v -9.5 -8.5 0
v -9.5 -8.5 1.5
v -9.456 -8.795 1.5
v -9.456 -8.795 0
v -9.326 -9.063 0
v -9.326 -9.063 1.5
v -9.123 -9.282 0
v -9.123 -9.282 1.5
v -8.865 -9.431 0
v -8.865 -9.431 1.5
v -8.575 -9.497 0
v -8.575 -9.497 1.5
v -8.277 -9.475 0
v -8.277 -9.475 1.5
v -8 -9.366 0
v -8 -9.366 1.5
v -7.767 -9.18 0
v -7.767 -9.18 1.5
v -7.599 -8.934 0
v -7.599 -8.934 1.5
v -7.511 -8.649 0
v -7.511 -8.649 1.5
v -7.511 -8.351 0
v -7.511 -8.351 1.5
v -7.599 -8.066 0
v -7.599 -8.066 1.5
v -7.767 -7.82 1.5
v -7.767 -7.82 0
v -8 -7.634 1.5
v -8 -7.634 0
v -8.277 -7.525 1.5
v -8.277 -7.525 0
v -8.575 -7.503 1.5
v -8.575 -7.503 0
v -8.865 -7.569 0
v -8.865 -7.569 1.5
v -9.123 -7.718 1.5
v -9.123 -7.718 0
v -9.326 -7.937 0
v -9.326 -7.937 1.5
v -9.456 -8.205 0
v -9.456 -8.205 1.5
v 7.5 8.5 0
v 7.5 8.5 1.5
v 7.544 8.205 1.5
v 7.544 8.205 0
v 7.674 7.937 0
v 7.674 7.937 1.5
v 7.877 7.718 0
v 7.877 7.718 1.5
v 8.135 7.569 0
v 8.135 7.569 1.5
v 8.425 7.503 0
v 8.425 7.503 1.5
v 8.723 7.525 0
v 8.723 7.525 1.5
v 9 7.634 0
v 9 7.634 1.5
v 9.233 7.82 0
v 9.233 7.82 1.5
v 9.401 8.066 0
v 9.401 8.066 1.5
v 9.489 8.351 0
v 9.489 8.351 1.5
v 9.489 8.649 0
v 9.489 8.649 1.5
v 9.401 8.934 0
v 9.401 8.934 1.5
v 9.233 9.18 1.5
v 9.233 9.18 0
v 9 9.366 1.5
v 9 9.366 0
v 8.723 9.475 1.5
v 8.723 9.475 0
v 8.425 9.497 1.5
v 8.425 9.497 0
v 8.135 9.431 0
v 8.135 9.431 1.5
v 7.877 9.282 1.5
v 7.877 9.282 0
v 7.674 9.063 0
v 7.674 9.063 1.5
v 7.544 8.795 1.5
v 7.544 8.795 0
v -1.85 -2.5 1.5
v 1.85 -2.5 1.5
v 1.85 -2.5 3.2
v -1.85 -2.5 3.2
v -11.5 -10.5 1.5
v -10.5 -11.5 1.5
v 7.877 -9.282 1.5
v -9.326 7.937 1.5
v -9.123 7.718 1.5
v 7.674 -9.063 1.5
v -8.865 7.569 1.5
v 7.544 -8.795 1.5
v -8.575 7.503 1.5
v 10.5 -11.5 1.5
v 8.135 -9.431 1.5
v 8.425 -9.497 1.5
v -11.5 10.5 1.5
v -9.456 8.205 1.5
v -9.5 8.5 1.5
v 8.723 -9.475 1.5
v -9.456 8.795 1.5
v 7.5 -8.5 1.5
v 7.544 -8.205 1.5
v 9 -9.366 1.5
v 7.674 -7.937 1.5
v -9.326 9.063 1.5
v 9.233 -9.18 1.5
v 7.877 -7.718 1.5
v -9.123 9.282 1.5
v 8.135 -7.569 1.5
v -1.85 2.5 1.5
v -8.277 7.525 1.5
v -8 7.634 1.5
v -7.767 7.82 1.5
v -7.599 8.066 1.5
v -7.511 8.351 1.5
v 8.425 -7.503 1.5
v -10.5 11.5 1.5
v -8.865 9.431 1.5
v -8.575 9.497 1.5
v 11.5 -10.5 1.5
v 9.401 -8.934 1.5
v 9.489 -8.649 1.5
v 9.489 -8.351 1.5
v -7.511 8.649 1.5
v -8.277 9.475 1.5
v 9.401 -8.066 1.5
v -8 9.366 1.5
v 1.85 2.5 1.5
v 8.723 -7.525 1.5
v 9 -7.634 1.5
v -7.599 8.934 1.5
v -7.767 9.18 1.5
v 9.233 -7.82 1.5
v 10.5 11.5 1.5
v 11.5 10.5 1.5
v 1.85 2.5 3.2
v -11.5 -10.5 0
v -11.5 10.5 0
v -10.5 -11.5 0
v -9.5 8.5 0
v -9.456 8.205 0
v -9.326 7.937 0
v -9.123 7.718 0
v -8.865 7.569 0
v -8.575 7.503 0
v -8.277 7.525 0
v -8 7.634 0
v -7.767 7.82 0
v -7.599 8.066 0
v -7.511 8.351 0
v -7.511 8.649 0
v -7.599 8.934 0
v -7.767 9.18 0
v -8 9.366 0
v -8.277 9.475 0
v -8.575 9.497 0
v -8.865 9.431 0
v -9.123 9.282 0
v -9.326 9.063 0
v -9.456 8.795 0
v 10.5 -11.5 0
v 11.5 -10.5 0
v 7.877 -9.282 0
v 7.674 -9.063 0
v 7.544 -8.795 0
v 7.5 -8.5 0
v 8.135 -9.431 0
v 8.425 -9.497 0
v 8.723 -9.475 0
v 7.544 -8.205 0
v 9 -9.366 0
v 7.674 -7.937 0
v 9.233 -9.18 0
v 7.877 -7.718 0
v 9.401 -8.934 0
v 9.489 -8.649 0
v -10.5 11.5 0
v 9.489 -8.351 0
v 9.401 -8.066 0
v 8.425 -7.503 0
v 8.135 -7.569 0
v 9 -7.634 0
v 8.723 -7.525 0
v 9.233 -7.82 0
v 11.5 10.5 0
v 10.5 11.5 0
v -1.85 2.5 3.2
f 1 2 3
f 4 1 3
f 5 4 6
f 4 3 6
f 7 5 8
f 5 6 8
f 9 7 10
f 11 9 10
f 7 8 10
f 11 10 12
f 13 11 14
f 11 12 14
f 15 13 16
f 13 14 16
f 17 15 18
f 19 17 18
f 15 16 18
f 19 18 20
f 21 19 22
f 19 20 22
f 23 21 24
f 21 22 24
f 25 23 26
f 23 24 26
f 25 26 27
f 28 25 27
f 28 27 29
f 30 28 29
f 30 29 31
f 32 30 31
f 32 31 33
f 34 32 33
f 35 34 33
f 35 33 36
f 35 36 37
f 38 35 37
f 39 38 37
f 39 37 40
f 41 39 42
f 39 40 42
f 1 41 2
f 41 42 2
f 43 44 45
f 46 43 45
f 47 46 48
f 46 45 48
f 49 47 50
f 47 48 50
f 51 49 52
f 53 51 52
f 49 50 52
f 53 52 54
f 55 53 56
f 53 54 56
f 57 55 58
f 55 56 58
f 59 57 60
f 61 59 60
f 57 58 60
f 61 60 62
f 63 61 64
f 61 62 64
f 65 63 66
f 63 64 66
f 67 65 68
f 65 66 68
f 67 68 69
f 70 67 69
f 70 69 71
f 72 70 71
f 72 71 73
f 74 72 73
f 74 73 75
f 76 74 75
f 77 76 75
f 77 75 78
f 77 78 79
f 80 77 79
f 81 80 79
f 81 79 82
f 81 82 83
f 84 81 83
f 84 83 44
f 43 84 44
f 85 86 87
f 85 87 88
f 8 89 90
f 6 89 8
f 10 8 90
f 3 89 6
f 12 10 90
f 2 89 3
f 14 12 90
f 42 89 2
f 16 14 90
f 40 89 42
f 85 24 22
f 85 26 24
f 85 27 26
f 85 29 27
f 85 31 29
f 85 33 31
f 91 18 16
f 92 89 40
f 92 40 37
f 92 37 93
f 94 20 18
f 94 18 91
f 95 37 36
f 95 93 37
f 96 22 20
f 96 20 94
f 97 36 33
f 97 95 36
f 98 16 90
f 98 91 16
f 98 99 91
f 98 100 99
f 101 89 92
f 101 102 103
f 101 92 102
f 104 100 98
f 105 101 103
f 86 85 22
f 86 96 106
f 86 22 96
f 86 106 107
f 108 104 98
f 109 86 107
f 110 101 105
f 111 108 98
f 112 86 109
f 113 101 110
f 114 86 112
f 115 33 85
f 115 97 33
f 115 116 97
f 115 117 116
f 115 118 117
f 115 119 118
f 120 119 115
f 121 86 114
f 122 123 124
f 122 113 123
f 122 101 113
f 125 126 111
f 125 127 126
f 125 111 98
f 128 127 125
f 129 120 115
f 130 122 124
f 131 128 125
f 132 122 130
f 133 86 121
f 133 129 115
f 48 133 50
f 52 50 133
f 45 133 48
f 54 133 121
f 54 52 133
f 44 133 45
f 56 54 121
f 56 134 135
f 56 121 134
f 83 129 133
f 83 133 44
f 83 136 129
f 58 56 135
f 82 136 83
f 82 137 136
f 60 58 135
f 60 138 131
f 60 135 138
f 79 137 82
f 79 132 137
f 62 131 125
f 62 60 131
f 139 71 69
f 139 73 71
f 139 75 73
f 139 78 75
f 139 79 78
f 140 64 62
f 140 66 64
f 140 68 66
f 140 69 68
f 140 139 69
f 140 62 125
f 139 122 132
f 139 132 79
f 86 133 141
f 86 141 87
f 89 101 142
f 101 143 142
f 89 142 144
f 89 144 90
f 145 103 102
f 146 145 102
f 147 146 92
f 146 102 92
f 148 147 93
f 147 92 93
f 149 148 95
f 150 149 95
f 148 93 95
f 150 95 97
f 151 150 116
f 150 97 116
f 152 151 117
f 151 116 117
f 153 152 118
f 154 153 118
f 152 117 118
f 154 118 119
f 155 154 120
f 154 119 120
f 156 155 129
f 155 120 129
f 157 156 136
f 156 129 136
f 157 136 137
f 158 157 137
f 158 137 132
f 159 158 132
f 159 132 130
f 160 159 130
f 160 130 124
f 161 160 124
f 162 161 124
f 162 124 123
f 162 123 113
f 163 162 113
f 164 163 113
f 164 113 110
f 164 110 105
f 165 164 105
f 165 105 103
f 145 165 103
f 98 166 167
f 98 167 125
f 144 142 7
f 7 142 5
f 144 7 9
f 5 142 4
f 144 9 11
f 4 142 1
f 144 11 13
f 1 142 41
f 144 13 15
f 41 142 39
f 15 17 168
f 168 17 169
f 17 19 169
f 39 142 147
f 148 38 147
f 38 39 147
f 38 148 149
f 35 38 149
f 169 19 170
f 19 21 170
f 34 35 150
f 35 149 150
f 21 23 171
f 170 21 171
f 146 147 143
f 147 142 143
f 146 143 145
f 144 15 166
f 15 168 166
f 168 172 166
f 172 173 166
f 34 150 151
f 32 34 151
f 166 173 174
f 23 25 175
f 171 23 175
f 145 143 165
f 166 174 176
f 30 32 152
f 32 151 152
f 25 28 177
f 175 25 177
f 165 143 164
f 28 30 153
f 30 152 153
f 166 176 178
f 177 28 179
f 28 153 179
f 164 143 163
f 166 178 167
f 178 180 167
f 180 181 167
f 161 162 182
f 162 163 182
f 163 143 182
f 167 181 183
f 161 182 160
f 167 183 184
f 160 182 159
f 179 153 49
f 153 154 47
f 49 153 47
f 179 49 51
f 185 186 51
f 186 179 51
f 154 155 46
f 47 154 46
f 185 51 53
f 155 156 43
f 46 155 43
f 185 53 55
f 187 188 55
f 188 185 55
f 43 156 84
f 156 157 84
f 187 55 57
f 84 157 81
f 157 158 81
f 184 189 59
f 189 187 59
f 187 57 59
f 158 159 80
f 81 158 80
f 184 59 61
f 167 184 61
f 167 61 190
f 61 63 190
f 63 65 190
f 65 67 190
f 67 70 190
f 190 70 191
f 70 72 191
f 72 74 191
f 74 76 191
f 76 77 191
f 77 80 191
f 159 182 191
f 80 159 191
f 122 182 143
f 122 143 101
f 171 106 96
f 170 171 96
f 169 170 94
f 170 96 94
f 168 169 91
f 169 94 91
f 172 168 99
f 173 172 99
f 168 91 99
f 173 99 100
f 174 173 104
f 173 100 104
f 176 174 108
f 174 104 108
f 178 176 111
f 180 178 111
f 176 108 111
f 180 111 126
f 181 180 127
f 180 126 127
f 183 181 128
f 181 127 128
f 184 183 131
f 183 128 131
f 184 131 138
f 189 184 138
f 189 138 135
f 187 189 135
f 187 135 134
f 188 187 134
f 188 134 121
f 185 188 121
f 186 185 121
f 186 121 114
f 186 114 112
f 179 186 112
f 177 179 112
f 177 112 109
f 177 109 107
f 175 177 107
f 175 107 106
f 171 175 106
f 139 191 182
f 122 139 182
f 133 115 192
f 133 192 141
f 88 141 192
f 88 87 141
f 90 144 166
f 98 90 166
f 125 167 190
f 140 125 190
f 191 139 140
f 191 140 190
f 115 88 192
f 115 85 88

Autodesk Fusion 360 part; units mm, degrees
sketch "Sketch1" plane through (0, 0, 0) normal (0, 0, 1) x (1, 0, 0)
  line L0 (11.5, 11.5) -> (-11.5, 11.5)
  line L1 (-11.5, 11.5) -> (-11.5, -11.5)
  line L2 (-11.5, -11.5) -> (11.5, -11.5)
  line L3 (11.5, -11.5) -> (11.5, 11.5)
  line L4 (11.5, 11.5) -> (-11.5, -11.5) construction
  line L5 (-11.5, 11.5) -> (11.5, -11.5) construction
  dimension "d1" = 23
  dimension "d2" = 23
extrude "Extrude1" add sketch "Sketch1" along normal blind 1.5
chamfer "Chamfer1" distance 1 angle 45 4 edges at (-11.5, -11.5, 0.75) (11.5, -11.5, 0.75) (11.5, 11.5, 0.75) (-11.5, 11.5, 0.75)
sketch "Sketch2" plane through (0, 0, 1.5) normal (0, 0, 1) x (-1, 0, 0)
  line L0 (10.5, -11.5) -> (11.5, -10.5)
  line L1 (11.5, -10.5) -> (11.5, 10.5)
  line L2 (11.5, 10.5) -> (10.5, 11.5)
  line L3 (10.5, 11.5) -> (-10.5, 11.5)
  line L4 (-10.5, 11.5) -> (-11.5, 10.5)
  line L5 (-11.5, 10.5) -> (-11.5, -10.5)
  line L6 (-11.5, -10.5) -> (-10.5, -11.5)
  line L7 (-10.5, -11.5) -> (10.5, -11.5)
  line L8 (-1.85, 2.5) -> (1.85, 2.5)
  line L9 (1.85, 2.5) -> (1.85, -2.5)
  line L10 (1.85, -2.5) -> (-1.85, -2.5)
  line L11 (-1.85, -2.5) -> (-1.85, 2.5)
  line L12 (-1.85, 2.5) -> (1.85, -2.5) construction
  line L13 (1.85, 2.5) -> (-1.85, -2.5) construction
  dimension "d6" = 3.7
  dimension "d7" = 5
extrude "Extrude2" add sketch "Sketch2" along normal blind 1.7 contours L8 L9 L10 L11
sketch "Sketch3" plane through (0, 0, 1.5) normal (0, 0, 1) x (-1, 0, 0)
  line L0 (-1.85, -2.5) -> (-1.85, 2.5)
  line L1 (-1.85, 2.5) -> (1.85, 2.5)
  line L2 (1.85, 2.5) -> (1.85, -2.5)
  line L3 (1.85, -2.5) -> (-1.85, -2.5)
  line L4 (10.5, -11.5) -> (11.5, -10.5)
  line L5 (11.5, -10.5) -> (11.5, 10.5)
  line L6 (11.5, 10.5) -> (10.5, 11.5)
  line L7 (10.5, 11.5) -> (-10.5, 11.5)
  line L8 (-10.5, 11.5) -> (-11.5, 10.5)
  line L9 (-11.5, 10.5) -> (-11.5, -10.5)
  line L10 (-11.5, -10.5) -> (-10.5, -11.5)
  line L11 (-10.5, -11.5) -> (10.5, -11.5)
  line L12 (-8.5, -8.5) -> (8.5, -8.5) construction
  line L13 (8.5, -8.5) -> (8.5, 8.5) construction
  line L14 (8.5, 8.5) -> (-8.5, 8.5) construction
  line L15 (-8.5, 8.5) -> (-8.5, -8.5) construction
  line L16 (-8.5, -8.5) -> (8.5, 8.5) construction
  line L17 (8.5, -8.5) -> (-8.5, 8.5) construction
  circle A0 centre (8.5, -8.5) radius 1
  circle A1 centre (-8.5, -8.5) radius 1
  circle A2 centre (-8.5, 8.5) radius 1
  circle A3 centre (8.5, 8.5) radius 1
  dimension "d10" = 2
  dimension "d11" = 17
extrude "Extrude3" cut sketch "Sketch3" against normal up to surface (1.5 mm away) contours A0 | A1 | A2 | A3
equation "d8 = 3.2 mm - 1.5 mm"
